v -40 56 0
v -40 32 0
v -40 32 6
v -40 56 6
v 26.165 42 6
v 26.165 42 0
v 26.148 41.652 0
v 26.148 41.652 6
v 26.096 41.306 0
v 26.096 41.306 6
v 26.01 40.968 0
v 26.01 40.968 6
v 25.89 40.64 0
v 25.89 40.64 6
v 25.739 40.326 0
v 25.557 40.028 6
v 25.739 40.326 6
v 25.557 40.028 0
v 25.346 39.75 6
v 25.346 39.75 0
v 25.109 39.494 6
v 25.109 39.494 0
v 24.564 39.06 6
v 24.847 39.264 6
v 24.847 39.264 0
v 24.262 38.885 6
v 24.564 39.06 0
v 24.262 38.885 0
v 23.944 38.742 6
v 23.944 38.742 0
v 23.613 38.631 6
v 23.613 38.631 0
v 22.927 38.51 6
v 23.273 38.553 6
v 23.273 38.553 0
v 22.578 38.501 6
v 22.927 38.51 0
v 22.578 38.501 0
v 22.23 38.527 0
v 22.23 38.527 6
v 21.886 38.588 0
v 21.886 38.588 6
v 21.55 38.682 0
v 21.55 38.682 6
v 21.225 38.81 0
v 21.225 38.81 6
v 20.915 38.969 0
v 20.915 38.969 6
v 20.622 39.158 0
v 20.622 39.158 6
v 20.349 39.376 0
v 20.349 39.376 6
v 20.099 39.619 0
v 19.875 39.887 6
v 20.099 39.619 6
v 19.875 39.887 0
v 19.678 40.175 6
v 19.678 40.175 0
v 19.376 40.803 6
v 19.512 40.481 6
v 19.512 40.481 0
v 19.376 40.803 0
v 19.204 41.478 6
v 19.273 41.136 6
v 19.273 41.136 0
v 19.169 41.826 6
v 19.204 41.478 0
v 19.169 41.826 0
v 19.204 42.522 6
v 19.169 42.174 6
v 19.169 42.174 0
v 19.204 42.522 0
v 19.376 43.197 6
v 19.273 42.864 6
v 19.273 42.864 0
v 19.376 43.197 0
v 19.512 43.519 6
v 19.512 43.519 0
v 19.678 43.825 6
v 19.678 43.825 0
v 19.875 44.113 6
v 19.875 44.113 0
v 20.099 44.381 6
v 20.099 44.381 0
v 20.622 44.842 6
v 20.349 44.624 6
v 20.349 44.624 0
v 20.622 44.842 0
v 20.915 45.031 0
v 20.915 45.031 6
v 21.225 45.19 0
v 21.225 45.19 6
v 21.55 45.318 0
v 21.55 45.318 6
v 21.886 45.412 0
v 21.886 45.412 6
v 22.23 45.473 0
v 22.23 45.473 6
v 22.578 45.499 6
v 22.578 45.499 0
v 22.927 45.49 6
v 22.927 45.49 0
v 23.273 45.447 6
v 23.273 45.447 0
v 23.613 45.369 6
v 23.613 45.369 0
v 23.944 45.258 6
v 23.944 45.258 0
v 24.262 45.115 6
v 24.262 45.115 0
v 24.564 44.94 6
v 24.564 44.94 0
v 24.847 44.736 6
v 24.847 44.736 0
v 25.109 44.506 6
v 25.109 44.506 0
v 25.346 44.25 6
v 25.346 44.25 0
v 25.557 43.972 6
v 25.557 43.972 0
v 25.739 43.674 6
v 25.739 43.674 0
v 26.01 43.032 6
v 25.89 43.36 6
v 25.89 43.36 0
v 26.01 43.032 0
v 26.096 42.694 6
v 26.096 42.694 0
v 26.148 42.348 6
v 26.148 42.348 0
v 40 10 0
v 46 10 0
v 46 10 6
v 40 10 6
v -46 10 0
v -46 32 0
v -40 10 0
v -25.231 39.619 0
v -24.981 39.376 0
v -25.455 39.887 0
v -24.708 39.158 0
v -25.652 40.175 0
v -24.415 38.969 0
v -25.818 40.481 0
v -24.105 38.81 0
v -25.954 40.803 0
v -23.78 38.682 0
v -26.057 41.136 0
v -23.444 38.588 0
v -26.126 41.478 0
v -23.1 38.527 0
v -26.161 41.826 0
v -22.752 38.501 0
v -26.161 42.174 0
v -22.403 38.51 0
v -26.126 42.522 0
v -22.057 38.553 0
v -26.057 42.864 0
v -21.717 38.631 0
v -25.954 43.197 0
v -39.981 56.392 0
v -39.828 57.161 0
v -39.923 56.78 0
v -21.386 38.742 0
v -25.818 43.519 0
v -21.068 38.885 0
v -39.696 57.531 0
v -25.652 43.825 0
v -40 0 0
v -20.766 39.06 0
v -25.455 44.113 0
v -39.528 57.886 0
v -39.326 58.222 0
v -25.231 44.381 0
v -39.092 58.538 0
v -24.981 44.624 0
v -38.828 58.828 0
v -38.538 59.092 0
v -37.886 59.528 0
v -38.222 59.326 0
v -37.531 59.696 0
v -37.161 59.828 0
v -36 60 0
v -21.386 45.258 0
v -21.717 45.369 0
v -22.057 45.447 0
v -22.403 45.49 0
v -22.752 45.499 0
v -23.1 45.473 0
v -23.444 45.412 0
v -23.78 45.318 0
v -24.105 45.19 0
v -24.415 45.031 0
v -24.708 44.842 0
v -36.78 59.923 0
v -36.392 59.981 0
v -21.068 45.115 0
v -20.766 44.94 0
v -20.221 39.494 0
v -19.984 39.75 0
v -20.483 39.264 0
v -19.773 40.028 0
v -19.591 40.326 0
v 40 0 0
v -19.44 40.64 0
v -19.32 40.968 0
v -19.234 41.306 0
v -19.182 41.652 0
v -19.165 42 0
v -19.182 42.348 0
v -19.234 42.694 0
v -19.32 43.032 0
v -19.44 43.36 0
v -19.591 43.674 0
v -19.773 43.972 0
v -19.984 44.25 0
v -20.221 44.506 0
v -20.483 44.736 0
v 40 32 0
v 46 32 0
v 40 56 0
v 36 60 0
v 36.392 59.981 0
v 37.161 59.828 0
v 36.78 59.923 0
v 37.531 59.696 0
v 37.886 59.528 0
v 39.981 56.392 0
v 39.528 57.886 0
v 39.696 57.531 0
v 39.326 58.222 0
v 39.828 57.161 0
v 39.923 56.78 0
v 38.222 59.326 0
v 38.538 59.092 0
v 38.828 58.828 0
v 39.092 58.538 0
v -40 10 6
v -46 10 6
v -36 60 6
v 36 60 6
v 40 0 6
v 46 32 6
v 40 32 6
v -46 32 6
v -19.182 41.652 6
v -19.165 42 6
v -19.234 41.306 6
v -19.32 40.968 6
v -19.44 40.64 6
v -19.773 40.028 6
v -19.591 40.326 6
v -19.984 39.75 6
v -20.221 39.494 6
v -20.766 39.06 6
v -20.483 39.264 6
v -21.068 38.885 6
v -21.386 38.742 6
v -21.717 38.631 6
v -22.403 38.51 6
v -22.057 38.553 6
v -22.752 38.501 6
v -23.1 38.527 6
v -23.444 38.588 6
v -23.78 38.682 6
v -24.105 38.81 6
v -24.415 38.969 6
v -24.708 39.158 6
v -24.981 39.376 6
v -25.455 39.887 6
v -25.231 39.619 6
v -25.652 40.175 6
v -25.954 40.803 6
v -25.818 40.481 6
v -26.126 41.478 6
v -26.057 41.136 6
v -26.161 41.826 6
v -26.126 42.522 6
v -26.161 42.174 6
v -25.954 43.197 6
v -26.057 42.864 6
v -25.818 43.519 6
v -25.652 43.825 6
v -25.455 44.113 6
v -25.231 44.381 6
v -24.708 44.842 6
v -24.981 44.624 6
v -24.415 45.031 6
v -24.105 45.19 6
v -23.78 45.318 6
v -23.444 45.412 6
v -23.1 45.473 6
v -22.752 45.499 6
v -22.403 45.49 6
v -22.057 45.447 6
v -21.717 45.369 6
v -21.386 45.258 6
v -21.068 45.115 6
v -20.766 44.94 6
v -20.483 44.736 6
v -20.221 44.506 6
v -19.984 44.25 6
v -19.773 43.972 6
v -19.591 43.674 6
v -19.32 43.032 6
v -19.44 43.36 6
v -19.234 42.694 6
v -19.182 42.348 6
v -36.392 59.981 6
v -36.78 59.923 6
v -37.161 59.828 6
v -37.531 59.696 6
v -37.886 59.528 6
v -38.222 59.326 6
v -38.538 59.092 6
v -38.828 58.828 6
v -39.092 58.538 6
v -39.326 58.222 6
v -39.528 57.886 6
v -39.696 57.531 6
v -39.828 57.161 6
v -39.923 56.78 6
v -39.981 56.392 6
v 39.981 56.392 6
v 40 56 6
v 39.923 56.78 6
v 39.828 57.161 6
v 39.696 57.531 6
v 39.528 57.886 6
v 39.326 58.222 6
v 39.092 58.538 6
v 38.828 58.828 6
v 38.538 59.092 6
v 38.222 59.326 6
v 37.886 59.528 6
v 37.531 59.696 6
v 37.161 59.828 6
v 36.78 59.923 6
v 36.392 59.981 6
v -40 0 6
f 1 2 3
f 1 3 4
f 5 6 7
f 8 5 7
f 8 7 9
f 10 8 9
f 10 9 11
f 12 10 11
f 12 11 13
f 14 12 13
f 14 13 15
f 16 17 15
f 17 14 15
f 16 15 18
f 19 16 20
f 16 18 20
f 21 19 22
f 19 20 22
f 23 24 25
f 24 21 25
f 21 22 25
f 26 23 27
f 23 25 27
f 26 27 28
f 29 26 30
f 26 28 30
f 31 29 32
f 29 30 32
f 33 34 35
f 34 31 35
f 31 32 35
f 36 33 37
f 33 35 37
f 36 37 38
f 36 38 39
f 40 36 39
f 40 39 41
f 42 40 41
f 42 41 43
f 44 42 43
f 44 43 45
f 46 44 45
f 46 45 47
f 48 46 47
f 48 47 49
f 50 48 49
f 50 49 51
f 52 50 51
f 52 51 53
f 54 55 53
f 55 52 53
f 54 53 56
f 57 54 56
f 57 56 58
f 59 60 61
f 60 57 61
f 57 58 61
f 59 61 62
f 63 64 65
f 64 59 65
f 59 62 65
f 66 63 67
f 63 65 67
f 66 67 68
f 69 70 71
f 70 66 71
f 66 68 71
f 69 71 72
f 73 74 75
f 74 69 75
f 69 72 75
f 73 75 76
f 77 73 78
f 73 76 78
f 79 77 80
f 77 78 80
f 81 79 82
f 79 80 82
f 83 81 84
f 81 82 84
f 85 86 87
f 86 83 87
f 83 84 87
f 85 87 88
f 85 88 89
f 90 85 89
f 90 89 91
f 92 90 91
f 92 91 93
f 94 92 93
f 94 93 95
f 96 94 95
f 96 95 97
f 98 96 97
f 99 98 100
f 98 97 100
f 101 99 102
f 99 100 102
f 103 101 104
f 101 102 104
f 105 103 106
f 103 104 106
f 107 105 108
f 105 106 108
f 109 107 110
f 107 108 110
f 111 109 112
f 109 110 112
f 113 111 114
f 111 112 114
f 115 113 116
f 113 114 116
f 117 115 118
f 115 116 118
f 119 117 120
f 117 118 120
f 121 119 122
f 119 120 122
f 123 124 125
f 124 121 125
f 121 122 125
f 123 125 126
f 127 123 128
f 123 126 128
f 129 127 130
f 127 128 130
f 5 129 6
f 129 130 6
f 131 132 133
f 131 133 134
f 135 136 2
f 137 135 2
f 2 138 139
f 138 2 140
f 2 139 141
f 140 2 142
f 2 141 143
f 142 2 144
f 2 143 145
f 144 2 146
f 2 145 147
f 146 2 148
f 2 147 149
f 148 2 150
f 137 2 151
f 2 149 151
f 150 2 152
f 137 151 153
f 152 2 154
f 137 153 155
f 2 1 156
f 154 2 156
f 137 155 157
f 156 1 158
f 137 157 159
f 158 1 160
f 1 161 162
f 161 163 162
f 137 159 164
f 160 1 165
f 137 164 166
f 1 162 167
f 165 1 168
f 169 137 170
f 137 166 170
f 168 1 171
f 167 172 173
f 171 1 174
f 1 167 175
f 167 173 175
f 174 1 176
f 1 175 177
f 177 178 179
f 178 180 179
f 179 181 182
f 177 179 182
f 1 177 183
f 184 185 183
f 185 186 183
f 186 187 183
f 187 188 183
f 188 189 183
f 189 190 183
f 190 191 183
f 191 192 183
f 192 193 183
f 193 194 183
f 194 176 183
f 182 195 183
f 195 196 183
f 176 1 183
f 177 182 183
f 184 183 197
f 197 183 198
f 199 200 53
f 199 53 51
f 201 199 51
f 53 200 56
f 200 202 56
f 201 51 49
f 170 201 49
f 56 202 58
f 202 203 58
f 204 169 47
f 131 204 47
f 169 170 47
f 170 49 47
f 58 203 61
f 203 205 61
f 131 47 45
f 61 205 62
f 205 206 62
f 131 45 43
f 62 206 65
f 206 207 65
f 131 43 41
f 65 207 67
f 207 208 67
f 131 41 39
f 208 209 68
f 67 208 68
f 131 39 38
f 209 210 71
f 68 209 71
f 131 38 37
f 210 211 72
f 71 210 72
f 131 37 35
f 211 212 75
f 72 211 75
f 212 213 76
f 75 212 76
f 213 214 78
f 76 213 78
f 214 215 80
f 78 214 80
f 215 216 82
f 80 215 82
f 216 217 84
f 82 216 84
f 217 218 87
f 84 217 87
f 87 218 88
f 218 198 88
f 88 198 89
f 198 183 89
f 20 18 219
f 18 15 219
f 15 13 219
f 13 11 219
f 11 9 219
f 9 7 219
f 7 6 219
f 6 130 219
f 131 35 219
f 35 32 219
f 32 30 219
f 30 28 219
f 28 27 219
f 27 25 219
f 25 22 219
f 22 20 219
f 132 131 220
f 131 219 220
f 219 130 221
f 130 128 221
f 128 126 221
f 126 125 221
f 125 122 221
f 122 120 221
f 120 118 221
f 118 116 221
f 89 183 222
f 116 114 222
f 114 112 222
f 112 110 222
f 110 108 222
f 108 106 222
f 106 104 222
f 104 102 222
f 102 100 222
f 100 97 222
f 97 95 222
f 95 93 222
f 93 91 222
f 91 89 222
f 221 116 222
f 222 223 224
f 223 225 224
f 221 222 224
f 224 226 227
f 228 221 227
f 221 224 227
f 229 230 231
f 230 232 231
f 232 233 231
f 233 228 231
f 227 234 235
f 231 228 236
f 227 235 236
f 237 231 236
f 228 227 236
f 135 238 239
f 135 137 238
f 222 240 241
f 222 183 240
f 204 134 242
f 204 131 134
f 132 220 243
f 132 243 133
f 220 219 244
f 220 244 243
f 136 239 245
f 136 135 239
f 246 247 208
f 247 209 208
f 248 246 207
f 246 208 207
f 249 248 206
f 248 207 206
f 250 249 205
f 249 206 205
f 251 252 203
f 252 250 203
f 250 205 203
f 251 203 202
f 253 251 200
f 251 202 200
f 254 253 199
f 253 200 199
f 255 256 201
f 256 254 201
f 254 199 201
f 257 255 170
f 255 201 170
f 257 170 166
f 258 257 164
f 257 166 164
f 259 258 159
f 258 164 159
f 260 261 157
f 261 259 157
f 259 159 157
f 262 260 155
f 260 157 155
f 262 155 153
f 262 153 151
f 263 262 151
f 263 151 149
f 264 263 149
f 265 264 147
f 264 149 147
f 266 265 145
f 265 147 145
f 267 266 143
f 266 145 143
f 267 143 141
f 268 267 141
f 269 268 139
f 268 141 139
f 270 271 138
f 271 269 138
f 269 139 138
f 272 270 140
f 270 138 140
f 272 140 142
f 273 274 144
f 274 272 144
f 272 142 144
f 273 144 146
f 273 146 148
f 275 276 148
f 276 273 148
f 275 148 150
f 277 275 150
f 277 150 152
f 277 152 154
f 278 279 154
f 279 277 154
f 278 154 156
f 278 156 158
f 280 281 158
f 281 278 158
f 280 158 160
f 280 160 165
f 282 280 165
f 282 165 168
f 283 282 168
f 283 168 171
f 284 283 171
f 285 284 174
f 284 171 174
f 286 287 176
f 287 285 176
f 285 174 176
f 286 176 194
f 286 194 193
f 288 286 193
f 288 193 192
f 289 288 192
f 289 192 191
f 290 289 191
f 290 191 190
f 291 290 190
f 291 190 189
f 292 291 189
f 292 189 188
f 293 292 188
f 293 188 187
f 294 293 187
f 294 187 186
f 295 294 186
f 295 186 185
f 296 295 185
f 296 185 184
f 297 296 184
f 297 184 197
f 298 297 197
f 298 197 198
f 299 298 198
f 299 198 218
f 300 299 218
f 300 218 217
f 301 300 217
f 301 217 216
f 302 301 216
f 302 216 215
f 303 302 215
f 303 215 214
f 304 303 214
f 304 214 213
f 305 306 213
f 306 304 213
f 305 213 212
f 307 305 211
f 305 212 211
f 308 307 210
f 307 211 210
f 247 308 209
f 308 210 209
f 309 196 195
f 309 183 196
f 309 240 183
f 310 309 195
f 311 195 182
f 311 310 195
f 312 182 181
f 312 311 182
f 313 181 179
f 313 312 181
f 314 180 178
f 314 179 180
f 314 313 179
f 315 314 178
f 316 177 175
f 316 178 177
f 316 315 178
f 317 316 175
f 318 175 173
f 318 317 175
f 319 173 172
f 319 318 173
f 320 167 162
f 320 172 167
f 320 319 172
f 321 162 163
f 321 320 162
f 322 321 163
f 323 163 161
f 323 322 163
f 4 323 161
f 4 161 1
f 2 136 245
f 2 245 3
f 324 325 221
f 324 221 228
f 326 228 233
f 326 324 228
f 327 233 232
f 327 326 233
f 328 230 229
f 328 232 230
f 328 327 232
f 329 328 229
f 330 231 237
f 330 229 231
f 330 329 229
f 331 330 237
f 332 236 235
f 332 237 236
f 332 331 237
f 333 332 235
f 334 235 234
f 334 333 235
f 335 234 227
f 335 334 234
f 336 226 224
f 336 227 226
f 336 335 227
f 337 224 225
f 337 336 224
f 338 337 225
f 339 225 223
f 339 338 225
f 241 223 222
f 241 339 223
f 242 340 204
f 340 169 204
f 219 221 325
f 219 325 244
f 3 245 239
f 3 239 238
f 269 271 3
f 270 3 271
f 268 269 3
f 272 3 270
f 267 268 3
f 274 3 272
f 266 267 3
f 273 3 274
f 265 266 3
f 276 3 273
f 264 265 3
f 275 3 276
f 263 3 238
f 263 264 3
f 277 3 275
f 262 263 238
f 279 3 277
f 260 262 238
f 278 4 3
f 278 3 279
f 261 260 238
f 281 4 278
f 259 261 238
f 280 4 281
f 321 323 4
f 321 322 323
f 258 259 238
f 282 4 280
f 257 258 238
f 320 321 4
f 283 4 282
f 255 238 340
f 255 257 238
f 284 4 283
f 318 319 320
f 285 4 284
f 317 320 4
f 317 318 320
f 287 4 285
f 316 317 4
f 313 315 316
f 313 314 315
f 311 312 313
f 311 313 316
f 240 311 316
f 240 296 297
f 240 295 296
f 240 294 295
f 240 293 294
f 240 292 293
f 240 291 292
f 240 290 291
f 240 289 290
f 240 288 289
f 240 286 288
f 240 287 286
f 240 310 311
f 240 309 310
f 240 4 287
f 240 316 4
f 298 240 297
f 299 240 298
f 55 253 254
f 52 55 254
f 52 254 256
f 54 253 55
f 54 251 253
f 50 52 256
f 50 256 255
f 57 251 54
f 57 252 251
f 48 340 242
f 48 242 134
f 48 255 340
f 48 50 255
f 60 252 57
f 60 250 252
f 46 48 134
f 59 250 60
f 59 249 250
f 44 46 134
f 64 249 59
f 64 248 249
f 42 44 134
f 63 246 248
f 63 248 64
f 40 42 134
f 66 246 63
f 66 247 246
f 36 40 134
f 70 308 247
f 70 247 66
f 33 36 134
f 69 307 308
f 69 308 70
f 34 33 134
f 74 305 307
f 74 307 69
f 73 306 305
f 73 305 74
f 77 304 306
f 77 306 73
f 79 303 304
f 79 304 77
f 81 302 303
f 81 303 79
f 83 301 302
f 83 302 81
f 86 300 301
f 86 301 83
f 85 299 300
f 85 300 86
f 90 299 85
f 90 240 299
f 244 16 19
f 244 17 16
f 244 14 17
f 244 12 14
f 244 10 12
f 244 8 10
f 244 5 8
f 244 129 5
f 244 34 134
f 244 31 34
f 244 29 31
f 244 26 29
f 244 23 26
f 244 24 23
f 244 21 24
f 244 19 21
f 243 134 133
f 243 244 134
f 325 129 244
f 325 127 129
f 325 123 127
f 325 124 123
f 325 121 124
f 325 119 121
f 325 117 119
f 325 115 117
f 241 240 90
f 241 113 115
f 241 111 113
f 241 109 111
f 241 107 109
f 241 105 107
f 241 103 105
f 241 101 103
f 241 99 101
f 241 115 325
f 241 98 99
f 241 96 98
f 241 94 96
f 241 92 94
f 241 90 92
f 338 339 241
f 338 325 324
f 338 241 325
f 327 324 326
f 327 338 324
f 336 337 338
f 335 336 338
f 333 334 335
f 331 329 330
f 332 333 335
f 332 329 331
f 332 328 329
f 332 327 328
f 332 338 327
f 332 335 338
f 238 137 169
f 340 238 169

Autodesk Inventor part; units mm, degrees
ref_plane "YZ Plane" through (0, 0, 0) normal (1, 0, 0) x (0, 1, 0)
ref_plane "XZ Plane" through (0, 0, 0) normal (0, 1, 0) x (-1, 0, 0)
ref_plane "XY Plane" through (0, 0, 0) normal (0, 0, 1) x (1, 0, 0)
sketch "Sketch1" plane through (0, 0, 0) normal (0, 0, 1) x (1, 0, 0)
  line L0 (-40, 0) -> (40, 0)
  circle A0 centre (-22.665, 42) radius 3.5
  circle A1 centre (22.665, 42) radius 3.5
  line L1 (-40, 10) -> (-40, 0)
  line L2 (40, 60) -> (40, 32)
  line L3 (40, 32) -> (46, 32)
  line L4 (46, 32) -> (46, 10)
  line L5 (46, 10) -> (40, 10)
  line L6 (40, 10) -> (40, 0)
  line L7 (-40, 10) -> (-46, 10)
  line L8 (-46, 10) -> (-46, 32)
  line L9 (-46, 32) -> (-40, 32)
  line L10 (-40, 32) -> (-40, 60)
  line L11 (-40, 60) -> (40, 60)
  point P0 (0, 0)
  point P1 (0, 42)
  point P2 (0, 0)
  dimension "d1" = 60
  dimension "d4" = 80
  dimension "d5" = 7
  dimension "d7" = 7
  dimension "d9" = 22.665
  dimension "d10" = 22.665
  dimension "d11" = 42
  dimension "d32" = 6
  dimension "d33" = 28
  dimension "d34" = 10
  dimension "d35" = 10
  dimension "d36" = 28
  dimension "d37" = 6
  dimension "d38" = 6
  dimension "d39" = 22
extrude "Extrusion2" add sketch "Sketch1" along normal blind 6
fillet "Fillet3" radius 4 2 edges at (-40, 60, 3) (40, 60, 3)
equation "\"d1\" = d0"
equation "\"d7\" = d5"
equation "\"d10\" = d9"
equation "\"d32\" = d28"
equation "\"d33\" = d29"
equation "\"d35\" = d34"
equation "\"d36\" = d33"
equation "\"d37\" = d32"
equation "\"d0\" = 60"
equation "\"d28\" = 6"
equation "\"d29\" = 28"
properties part number "Tope riel final"
